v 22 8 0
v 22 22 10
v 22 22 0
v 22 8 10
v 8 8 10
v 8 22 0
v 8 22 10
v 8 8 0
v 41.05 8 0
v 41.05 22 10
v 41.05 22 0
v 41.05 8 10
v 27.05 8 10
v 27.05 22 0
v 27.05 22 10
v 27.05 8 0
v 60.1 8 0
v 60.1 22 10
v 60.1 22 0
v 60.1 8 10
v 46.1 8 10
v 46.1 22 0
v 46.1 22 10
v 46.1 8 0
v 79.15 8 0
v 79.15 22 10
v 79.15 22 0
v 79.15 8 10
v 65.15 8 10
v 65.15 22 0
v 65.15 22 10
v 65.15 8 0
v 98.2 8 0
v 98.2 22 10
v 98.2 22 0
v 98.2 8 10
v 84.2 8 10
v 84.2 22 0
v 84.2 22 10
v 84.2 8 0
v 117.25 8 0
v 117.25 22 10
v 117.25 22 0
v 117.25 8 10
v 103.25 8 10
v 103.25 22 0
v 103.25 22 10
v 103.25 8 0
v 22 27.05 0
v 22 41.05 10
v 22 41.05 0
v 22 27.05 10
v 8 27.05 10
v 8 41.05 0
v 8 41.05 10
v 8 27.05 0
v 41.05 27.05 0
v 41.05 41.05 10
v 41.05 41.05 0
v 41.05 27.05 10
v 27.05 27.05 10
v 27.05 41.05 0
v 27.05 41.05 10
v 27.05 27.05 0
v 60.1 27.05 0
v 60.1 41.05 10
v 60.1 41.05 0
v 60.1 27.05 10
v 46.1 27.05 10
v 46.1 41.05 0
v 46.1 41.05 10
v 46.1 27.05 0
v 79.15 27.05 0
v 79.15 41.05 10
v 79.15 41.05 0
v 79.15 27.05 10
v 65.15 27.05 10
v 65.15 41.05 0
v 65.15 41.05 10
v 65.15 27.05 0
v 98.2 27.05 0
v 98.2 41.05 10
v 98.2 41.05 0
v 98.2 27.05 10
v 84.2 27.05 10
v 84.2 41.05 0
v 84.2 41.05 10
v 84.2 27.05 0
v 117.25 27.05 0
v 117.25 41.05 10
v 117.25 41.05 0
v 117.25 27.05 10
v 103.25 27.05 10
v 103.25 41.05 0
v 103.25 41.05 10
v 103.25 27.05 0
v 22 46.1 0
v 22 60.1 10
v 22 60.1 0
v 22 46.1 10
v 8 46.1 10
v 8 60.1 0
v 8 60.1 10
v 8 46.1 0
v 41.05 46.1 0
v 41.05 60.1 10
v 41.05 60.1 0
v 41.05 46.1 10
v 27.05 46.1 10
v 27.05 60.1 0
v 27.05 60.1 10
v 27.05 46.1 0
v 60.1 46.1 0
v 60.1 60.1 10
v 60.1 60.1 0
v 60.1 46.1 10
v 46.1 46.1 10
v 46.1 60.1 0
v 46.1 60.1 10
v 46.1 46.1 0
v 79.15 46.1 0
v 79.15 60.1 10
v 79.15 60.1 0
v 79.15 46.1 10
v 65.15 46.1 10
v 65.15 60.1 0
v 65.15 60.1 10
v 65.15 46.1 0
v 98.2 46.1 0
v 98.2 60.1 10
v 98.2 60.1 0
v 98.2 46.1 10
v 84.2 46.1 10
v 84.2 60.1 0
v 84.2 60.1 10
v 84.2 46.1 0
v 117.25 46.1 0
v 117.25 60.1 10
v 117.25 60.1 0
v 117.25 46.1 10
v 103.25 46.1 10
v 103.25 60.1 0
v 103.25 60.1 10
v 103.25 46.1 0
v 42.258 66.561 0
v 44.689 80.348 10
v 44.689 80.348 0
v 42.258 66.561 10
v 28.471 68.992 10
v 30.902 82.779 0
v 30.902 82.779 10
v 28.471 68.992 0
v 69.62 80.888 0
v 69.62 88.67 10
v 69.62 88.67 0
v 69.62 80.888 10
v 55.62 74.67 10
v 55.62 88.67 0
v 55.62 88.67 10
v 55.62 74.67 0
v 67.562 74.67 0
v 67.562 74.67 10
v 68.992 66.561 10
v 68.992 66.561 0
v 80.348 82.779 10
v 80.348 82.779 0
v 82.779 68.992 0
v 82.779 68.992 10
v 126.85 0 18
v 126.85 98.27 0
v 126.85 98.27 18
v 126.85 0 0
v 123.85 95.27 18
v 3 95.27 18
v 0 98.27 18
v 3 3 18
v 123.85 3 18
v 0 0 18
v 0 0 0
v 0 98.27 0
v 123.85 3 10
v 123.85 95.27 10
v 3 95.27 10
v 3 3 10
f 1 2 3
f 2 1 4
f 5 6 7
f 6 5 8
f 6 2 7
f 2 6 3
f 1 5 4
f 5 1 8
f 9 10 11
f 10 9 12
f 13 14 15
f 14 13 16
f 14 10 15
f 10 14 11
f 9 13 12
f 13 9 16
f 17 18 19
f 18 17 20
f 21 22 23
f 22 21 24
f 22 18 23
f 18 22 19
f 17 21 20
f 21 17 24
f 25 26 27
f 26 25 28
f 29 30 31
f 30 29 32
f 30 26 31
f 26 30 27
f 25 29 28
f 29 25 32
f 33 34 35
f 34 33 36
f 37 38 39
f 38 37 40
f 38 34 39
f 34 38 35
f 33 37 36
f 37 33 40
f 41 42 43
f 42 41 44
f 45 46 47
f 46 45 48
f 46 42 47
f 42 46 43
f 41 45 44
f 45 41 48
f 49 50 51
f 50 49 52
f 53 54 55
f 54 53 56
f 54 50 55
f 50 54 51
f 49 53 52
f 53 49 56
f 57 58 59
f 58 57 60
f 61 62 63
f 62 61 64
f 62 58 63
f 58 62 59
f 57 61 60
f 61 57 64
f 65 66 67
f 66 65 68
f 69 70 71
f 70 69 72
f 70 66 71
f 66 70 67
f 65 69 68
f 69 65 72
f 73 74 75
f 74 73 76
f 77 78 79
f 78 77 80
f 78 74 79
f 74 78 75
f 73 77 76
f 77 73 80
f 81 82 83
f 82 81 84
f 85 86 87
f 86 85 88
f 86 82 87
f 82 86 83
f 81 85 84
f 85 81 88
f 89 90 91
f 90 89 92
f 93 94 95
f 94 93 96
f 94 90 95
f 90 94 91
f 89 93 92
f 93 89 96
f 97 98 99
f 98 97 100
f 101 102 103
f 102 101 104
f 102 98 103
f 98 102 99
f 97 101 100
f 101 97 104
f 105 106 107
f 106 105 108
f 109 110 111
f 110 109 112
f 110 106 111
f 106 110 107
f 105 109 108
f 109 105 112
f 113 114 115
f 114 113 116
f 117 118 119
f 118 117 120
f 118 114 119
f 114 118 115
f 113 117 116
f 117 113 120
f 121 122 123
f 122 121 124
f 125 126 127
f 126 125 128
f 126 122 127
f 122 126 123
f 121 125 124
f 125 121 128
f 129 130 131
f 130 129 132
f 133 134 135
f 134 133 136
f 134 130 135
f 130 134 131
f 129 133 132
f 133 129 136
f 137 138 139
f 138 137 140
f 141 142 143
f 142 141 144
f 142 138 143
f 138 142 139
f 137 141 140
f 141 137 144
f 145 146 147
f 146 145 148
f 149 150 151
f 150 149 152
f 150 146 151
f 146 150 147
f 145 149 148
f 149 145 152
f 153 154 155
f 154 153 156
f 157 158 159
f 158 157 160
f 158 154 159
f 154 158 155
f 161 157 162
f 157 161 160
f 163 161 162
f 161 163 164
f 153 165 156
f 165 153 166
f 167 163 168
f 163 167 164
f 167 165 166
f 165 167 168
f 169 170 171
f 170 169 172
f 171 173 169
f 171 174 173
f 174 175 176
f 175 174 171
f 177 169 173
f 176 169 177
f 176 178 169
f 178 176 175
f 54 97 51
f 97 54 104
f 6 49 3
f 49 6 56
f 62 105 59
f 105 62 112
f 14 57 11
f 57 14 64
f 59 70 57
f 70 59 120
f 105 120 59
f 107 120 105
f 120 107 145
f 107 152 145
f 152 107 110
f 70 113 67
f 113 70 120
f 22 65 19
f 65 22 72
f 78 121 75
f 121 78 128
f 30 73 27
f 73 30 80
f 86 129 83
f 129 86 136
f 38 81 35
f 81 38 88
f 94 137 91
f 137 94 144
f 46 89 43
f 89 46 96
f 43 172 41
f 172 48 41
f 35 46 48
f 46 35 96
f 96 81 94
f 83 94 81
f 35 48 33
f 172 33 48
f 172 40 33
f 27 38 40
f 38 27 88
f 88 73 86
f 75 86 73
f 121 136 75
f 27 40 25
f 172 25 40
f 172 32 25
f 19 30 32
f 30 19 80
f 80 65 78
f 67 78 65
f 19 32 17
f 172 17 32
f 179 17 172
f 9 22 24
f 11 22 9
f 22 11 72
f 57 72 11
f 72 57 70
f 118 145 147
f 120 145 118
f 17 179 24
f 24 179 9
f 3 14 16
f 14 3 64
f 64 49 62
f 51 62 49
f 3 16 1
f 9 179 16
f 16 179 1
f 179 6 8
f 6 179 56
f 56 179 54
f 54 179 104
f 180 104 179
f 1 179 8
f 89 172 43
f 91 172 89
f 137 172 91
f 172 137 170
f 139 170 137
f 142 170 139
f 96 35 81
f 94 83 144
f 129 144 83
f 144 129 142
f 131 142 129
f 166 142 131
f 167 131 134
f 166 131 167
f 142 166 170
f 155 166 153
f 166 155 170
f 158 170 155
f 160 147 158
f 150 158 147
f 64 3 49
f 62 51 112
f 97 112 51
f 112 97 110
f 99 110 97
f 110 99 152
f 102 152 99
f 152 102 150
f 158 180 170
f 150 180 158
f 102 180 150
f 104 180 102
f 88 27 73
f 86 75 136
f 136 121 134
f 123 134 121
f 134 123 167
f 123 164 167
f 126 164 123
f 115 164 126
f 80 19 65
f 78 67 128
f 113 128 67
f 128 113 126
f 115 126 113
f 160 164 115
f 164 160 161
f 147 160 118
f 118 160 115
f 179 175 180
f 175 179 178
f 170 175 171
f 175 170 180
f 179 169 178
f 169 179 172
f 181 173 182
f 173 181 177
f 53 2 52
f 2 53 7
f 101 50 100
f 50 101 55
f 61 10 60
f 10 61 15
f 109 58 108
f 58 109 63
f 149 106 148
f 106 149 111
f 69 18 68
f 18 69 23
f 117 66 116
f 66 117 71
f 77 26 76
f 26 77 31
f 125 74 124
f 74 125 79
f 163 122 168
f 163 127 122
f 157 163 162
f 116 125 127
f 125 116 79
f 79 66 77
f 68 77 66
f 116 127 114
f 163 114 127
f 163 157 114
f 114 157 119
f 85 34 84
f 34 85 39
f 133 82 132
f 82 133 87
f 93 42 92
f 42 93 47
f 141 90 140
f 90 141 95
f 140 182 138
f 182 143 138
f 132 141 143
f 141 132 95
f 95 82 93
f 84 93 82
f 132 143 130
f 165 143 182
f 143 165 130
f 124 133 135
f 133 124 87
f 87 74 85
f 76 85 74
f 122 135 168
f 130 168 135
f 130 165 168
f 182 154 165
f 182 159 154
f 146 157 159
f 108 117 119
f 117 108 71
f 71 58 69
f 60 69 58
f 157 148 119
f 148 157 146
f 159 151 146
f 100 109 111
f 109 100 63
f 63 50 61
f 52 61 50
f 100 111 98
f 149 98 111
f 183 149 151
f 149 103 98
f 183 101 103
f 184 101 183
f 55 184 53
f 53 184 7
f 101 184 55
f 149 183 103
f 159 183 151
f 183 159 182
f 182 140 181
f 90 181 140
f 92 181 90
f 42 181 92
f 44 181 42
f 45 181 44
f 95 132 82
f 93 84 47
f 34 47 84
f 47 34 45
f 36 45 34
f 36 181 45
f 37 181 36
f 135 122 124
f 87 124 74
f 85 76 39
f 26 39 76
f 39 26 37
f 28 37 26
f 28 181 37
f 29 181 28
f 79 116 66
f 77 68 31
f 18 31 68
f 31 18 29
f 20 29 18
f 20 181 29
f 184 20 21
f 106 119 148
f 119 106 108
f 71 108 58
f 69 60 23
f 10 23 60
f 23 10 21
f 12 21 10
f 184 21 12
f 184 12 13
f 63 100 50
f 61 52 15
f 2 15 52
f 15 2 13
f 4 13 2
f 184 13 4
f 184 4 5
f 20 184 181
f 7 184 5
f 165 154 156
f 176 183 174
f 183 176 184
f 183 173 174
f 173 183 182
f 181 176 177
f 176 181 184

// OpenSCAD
// Generated keyboard case
// Layout: 3x6
// Switch type: Cherry MX

// Parameters
case_width = 126.85;
case_height = 98.27;
case_depth = 18.00;
wall_thickness = 3.00;
base_height = 10.00;
switch_cutout_size = 14.00;
key_spacing = 19.05;

module keyboard_case() {
    difference() {
        // Outer shell
        translate([0, 0, 0])
            cube([case_width, case_height, case_depth]);

        // Inner cavity
        translate([wall_thickness, wall_thickness, base_height])
            cube([case_width - 2*wall_thickness, 
                  case_height - 2*wall_thickness, 
                  case_depth - base_height + 1]);

        // Switch cutouts
        translate([wall_thickness + 5 - 0.00, wall_thickness + 5 - 0.00, -1])
            switch_plate();
    }
}

module switch_plate() {
    translate([0.00, 0.00, 0])
        cube([switch_cutout_size, switch_cutout_size, base_height + 2]);
    translate([19.05, 0.00, 0])
        cube([switch_cutout_size, switch_cutout_size, base_height + 2]);
    translate([38.10, 0.00, 0])
        cube([switch_cutout_size, switch_cutout_size, base_height + 2]);
    translate([57.15, 0.00, 0])
        cube([switch_cutout_size, switch_cutout_size, base_height + 2]);
    translate([76.20, 0.00, 0])
        cube([switch_cutout_size, switch_cutout_size, base_height + 2]);
    translate([95.25, 0.00, 0])
        cube([switch_cutout_size, switch_cutout_size, base_height + 2]);
    translate([0.00, 19.05, 0])
        cube([switch_cutout_size, switch_cutout_size, base_height + 2]);
    translate([19.05, 19.05, 0])
        cube([switch_cutout_size, switch_cutout_size, base_height + 2]);
    translate([38.10, 19.05, 0])
        cube([switch_cutout_size, switch_cutout_size, base_height + 2]);
    translate([57.15, 19.05, 0])
        cube([switch_cutout_size, switch_cutout_size, base_height + 2]);
    translate([76.20, 19.05, 0])
        cube([switch_cutout_size, switch_cutout_size, base_height + 2]);
    translate([95.25, 19.05, 0])
        cube([switch_cutout_size, switch_cutout_size, base_height + 2]);
    translate([0.00, 38.10, 0])
        cube([switch_cutout_size, switch_cutout_size, base_height + 2]);
    translate([19.05, 38.10, 0])
        cube([switch_cutout_size, switch_cutout_size, base_height + 2]);
    translate([38.10, 38.10, 0])
        cube([switch_cutout_size, switch_cutout_size, base_height + 2]);
    translate([57.15, 38.10, 0])
        cube([switch_cutout_size, switch_cutout_size, base_height + 2]);
    translate([76.20, 38.10, 0])
        cube([switch_cutout_size, switch_cutout_size, base_height + 2]);
    translate([95.25, 38.10, 0])
        cube([switch_cutout_size, switch_cutout_size, base_height + 2]);
    translate([28.58, 66.67, 0])
        rotate([0, 0, -10.00])
            translate([-7.00, -7.00, 0])
                cube([switch_cutout_size, switch_cutout_size, base_height + 2]);
    translate([47.62, 66.67, 0])
        cube([switch_cutout_size, switch_cutout_size, base_height + 2]);
    translate([66.67, 66.67, 0])
        rotate([0, 0, 10.00])
            translate([-7.00, -7.00, 0])
                cube([switch_cutout_size, switch_cutout_size, base_height + 2]);
}

// Generate the case
keyboard_case();
